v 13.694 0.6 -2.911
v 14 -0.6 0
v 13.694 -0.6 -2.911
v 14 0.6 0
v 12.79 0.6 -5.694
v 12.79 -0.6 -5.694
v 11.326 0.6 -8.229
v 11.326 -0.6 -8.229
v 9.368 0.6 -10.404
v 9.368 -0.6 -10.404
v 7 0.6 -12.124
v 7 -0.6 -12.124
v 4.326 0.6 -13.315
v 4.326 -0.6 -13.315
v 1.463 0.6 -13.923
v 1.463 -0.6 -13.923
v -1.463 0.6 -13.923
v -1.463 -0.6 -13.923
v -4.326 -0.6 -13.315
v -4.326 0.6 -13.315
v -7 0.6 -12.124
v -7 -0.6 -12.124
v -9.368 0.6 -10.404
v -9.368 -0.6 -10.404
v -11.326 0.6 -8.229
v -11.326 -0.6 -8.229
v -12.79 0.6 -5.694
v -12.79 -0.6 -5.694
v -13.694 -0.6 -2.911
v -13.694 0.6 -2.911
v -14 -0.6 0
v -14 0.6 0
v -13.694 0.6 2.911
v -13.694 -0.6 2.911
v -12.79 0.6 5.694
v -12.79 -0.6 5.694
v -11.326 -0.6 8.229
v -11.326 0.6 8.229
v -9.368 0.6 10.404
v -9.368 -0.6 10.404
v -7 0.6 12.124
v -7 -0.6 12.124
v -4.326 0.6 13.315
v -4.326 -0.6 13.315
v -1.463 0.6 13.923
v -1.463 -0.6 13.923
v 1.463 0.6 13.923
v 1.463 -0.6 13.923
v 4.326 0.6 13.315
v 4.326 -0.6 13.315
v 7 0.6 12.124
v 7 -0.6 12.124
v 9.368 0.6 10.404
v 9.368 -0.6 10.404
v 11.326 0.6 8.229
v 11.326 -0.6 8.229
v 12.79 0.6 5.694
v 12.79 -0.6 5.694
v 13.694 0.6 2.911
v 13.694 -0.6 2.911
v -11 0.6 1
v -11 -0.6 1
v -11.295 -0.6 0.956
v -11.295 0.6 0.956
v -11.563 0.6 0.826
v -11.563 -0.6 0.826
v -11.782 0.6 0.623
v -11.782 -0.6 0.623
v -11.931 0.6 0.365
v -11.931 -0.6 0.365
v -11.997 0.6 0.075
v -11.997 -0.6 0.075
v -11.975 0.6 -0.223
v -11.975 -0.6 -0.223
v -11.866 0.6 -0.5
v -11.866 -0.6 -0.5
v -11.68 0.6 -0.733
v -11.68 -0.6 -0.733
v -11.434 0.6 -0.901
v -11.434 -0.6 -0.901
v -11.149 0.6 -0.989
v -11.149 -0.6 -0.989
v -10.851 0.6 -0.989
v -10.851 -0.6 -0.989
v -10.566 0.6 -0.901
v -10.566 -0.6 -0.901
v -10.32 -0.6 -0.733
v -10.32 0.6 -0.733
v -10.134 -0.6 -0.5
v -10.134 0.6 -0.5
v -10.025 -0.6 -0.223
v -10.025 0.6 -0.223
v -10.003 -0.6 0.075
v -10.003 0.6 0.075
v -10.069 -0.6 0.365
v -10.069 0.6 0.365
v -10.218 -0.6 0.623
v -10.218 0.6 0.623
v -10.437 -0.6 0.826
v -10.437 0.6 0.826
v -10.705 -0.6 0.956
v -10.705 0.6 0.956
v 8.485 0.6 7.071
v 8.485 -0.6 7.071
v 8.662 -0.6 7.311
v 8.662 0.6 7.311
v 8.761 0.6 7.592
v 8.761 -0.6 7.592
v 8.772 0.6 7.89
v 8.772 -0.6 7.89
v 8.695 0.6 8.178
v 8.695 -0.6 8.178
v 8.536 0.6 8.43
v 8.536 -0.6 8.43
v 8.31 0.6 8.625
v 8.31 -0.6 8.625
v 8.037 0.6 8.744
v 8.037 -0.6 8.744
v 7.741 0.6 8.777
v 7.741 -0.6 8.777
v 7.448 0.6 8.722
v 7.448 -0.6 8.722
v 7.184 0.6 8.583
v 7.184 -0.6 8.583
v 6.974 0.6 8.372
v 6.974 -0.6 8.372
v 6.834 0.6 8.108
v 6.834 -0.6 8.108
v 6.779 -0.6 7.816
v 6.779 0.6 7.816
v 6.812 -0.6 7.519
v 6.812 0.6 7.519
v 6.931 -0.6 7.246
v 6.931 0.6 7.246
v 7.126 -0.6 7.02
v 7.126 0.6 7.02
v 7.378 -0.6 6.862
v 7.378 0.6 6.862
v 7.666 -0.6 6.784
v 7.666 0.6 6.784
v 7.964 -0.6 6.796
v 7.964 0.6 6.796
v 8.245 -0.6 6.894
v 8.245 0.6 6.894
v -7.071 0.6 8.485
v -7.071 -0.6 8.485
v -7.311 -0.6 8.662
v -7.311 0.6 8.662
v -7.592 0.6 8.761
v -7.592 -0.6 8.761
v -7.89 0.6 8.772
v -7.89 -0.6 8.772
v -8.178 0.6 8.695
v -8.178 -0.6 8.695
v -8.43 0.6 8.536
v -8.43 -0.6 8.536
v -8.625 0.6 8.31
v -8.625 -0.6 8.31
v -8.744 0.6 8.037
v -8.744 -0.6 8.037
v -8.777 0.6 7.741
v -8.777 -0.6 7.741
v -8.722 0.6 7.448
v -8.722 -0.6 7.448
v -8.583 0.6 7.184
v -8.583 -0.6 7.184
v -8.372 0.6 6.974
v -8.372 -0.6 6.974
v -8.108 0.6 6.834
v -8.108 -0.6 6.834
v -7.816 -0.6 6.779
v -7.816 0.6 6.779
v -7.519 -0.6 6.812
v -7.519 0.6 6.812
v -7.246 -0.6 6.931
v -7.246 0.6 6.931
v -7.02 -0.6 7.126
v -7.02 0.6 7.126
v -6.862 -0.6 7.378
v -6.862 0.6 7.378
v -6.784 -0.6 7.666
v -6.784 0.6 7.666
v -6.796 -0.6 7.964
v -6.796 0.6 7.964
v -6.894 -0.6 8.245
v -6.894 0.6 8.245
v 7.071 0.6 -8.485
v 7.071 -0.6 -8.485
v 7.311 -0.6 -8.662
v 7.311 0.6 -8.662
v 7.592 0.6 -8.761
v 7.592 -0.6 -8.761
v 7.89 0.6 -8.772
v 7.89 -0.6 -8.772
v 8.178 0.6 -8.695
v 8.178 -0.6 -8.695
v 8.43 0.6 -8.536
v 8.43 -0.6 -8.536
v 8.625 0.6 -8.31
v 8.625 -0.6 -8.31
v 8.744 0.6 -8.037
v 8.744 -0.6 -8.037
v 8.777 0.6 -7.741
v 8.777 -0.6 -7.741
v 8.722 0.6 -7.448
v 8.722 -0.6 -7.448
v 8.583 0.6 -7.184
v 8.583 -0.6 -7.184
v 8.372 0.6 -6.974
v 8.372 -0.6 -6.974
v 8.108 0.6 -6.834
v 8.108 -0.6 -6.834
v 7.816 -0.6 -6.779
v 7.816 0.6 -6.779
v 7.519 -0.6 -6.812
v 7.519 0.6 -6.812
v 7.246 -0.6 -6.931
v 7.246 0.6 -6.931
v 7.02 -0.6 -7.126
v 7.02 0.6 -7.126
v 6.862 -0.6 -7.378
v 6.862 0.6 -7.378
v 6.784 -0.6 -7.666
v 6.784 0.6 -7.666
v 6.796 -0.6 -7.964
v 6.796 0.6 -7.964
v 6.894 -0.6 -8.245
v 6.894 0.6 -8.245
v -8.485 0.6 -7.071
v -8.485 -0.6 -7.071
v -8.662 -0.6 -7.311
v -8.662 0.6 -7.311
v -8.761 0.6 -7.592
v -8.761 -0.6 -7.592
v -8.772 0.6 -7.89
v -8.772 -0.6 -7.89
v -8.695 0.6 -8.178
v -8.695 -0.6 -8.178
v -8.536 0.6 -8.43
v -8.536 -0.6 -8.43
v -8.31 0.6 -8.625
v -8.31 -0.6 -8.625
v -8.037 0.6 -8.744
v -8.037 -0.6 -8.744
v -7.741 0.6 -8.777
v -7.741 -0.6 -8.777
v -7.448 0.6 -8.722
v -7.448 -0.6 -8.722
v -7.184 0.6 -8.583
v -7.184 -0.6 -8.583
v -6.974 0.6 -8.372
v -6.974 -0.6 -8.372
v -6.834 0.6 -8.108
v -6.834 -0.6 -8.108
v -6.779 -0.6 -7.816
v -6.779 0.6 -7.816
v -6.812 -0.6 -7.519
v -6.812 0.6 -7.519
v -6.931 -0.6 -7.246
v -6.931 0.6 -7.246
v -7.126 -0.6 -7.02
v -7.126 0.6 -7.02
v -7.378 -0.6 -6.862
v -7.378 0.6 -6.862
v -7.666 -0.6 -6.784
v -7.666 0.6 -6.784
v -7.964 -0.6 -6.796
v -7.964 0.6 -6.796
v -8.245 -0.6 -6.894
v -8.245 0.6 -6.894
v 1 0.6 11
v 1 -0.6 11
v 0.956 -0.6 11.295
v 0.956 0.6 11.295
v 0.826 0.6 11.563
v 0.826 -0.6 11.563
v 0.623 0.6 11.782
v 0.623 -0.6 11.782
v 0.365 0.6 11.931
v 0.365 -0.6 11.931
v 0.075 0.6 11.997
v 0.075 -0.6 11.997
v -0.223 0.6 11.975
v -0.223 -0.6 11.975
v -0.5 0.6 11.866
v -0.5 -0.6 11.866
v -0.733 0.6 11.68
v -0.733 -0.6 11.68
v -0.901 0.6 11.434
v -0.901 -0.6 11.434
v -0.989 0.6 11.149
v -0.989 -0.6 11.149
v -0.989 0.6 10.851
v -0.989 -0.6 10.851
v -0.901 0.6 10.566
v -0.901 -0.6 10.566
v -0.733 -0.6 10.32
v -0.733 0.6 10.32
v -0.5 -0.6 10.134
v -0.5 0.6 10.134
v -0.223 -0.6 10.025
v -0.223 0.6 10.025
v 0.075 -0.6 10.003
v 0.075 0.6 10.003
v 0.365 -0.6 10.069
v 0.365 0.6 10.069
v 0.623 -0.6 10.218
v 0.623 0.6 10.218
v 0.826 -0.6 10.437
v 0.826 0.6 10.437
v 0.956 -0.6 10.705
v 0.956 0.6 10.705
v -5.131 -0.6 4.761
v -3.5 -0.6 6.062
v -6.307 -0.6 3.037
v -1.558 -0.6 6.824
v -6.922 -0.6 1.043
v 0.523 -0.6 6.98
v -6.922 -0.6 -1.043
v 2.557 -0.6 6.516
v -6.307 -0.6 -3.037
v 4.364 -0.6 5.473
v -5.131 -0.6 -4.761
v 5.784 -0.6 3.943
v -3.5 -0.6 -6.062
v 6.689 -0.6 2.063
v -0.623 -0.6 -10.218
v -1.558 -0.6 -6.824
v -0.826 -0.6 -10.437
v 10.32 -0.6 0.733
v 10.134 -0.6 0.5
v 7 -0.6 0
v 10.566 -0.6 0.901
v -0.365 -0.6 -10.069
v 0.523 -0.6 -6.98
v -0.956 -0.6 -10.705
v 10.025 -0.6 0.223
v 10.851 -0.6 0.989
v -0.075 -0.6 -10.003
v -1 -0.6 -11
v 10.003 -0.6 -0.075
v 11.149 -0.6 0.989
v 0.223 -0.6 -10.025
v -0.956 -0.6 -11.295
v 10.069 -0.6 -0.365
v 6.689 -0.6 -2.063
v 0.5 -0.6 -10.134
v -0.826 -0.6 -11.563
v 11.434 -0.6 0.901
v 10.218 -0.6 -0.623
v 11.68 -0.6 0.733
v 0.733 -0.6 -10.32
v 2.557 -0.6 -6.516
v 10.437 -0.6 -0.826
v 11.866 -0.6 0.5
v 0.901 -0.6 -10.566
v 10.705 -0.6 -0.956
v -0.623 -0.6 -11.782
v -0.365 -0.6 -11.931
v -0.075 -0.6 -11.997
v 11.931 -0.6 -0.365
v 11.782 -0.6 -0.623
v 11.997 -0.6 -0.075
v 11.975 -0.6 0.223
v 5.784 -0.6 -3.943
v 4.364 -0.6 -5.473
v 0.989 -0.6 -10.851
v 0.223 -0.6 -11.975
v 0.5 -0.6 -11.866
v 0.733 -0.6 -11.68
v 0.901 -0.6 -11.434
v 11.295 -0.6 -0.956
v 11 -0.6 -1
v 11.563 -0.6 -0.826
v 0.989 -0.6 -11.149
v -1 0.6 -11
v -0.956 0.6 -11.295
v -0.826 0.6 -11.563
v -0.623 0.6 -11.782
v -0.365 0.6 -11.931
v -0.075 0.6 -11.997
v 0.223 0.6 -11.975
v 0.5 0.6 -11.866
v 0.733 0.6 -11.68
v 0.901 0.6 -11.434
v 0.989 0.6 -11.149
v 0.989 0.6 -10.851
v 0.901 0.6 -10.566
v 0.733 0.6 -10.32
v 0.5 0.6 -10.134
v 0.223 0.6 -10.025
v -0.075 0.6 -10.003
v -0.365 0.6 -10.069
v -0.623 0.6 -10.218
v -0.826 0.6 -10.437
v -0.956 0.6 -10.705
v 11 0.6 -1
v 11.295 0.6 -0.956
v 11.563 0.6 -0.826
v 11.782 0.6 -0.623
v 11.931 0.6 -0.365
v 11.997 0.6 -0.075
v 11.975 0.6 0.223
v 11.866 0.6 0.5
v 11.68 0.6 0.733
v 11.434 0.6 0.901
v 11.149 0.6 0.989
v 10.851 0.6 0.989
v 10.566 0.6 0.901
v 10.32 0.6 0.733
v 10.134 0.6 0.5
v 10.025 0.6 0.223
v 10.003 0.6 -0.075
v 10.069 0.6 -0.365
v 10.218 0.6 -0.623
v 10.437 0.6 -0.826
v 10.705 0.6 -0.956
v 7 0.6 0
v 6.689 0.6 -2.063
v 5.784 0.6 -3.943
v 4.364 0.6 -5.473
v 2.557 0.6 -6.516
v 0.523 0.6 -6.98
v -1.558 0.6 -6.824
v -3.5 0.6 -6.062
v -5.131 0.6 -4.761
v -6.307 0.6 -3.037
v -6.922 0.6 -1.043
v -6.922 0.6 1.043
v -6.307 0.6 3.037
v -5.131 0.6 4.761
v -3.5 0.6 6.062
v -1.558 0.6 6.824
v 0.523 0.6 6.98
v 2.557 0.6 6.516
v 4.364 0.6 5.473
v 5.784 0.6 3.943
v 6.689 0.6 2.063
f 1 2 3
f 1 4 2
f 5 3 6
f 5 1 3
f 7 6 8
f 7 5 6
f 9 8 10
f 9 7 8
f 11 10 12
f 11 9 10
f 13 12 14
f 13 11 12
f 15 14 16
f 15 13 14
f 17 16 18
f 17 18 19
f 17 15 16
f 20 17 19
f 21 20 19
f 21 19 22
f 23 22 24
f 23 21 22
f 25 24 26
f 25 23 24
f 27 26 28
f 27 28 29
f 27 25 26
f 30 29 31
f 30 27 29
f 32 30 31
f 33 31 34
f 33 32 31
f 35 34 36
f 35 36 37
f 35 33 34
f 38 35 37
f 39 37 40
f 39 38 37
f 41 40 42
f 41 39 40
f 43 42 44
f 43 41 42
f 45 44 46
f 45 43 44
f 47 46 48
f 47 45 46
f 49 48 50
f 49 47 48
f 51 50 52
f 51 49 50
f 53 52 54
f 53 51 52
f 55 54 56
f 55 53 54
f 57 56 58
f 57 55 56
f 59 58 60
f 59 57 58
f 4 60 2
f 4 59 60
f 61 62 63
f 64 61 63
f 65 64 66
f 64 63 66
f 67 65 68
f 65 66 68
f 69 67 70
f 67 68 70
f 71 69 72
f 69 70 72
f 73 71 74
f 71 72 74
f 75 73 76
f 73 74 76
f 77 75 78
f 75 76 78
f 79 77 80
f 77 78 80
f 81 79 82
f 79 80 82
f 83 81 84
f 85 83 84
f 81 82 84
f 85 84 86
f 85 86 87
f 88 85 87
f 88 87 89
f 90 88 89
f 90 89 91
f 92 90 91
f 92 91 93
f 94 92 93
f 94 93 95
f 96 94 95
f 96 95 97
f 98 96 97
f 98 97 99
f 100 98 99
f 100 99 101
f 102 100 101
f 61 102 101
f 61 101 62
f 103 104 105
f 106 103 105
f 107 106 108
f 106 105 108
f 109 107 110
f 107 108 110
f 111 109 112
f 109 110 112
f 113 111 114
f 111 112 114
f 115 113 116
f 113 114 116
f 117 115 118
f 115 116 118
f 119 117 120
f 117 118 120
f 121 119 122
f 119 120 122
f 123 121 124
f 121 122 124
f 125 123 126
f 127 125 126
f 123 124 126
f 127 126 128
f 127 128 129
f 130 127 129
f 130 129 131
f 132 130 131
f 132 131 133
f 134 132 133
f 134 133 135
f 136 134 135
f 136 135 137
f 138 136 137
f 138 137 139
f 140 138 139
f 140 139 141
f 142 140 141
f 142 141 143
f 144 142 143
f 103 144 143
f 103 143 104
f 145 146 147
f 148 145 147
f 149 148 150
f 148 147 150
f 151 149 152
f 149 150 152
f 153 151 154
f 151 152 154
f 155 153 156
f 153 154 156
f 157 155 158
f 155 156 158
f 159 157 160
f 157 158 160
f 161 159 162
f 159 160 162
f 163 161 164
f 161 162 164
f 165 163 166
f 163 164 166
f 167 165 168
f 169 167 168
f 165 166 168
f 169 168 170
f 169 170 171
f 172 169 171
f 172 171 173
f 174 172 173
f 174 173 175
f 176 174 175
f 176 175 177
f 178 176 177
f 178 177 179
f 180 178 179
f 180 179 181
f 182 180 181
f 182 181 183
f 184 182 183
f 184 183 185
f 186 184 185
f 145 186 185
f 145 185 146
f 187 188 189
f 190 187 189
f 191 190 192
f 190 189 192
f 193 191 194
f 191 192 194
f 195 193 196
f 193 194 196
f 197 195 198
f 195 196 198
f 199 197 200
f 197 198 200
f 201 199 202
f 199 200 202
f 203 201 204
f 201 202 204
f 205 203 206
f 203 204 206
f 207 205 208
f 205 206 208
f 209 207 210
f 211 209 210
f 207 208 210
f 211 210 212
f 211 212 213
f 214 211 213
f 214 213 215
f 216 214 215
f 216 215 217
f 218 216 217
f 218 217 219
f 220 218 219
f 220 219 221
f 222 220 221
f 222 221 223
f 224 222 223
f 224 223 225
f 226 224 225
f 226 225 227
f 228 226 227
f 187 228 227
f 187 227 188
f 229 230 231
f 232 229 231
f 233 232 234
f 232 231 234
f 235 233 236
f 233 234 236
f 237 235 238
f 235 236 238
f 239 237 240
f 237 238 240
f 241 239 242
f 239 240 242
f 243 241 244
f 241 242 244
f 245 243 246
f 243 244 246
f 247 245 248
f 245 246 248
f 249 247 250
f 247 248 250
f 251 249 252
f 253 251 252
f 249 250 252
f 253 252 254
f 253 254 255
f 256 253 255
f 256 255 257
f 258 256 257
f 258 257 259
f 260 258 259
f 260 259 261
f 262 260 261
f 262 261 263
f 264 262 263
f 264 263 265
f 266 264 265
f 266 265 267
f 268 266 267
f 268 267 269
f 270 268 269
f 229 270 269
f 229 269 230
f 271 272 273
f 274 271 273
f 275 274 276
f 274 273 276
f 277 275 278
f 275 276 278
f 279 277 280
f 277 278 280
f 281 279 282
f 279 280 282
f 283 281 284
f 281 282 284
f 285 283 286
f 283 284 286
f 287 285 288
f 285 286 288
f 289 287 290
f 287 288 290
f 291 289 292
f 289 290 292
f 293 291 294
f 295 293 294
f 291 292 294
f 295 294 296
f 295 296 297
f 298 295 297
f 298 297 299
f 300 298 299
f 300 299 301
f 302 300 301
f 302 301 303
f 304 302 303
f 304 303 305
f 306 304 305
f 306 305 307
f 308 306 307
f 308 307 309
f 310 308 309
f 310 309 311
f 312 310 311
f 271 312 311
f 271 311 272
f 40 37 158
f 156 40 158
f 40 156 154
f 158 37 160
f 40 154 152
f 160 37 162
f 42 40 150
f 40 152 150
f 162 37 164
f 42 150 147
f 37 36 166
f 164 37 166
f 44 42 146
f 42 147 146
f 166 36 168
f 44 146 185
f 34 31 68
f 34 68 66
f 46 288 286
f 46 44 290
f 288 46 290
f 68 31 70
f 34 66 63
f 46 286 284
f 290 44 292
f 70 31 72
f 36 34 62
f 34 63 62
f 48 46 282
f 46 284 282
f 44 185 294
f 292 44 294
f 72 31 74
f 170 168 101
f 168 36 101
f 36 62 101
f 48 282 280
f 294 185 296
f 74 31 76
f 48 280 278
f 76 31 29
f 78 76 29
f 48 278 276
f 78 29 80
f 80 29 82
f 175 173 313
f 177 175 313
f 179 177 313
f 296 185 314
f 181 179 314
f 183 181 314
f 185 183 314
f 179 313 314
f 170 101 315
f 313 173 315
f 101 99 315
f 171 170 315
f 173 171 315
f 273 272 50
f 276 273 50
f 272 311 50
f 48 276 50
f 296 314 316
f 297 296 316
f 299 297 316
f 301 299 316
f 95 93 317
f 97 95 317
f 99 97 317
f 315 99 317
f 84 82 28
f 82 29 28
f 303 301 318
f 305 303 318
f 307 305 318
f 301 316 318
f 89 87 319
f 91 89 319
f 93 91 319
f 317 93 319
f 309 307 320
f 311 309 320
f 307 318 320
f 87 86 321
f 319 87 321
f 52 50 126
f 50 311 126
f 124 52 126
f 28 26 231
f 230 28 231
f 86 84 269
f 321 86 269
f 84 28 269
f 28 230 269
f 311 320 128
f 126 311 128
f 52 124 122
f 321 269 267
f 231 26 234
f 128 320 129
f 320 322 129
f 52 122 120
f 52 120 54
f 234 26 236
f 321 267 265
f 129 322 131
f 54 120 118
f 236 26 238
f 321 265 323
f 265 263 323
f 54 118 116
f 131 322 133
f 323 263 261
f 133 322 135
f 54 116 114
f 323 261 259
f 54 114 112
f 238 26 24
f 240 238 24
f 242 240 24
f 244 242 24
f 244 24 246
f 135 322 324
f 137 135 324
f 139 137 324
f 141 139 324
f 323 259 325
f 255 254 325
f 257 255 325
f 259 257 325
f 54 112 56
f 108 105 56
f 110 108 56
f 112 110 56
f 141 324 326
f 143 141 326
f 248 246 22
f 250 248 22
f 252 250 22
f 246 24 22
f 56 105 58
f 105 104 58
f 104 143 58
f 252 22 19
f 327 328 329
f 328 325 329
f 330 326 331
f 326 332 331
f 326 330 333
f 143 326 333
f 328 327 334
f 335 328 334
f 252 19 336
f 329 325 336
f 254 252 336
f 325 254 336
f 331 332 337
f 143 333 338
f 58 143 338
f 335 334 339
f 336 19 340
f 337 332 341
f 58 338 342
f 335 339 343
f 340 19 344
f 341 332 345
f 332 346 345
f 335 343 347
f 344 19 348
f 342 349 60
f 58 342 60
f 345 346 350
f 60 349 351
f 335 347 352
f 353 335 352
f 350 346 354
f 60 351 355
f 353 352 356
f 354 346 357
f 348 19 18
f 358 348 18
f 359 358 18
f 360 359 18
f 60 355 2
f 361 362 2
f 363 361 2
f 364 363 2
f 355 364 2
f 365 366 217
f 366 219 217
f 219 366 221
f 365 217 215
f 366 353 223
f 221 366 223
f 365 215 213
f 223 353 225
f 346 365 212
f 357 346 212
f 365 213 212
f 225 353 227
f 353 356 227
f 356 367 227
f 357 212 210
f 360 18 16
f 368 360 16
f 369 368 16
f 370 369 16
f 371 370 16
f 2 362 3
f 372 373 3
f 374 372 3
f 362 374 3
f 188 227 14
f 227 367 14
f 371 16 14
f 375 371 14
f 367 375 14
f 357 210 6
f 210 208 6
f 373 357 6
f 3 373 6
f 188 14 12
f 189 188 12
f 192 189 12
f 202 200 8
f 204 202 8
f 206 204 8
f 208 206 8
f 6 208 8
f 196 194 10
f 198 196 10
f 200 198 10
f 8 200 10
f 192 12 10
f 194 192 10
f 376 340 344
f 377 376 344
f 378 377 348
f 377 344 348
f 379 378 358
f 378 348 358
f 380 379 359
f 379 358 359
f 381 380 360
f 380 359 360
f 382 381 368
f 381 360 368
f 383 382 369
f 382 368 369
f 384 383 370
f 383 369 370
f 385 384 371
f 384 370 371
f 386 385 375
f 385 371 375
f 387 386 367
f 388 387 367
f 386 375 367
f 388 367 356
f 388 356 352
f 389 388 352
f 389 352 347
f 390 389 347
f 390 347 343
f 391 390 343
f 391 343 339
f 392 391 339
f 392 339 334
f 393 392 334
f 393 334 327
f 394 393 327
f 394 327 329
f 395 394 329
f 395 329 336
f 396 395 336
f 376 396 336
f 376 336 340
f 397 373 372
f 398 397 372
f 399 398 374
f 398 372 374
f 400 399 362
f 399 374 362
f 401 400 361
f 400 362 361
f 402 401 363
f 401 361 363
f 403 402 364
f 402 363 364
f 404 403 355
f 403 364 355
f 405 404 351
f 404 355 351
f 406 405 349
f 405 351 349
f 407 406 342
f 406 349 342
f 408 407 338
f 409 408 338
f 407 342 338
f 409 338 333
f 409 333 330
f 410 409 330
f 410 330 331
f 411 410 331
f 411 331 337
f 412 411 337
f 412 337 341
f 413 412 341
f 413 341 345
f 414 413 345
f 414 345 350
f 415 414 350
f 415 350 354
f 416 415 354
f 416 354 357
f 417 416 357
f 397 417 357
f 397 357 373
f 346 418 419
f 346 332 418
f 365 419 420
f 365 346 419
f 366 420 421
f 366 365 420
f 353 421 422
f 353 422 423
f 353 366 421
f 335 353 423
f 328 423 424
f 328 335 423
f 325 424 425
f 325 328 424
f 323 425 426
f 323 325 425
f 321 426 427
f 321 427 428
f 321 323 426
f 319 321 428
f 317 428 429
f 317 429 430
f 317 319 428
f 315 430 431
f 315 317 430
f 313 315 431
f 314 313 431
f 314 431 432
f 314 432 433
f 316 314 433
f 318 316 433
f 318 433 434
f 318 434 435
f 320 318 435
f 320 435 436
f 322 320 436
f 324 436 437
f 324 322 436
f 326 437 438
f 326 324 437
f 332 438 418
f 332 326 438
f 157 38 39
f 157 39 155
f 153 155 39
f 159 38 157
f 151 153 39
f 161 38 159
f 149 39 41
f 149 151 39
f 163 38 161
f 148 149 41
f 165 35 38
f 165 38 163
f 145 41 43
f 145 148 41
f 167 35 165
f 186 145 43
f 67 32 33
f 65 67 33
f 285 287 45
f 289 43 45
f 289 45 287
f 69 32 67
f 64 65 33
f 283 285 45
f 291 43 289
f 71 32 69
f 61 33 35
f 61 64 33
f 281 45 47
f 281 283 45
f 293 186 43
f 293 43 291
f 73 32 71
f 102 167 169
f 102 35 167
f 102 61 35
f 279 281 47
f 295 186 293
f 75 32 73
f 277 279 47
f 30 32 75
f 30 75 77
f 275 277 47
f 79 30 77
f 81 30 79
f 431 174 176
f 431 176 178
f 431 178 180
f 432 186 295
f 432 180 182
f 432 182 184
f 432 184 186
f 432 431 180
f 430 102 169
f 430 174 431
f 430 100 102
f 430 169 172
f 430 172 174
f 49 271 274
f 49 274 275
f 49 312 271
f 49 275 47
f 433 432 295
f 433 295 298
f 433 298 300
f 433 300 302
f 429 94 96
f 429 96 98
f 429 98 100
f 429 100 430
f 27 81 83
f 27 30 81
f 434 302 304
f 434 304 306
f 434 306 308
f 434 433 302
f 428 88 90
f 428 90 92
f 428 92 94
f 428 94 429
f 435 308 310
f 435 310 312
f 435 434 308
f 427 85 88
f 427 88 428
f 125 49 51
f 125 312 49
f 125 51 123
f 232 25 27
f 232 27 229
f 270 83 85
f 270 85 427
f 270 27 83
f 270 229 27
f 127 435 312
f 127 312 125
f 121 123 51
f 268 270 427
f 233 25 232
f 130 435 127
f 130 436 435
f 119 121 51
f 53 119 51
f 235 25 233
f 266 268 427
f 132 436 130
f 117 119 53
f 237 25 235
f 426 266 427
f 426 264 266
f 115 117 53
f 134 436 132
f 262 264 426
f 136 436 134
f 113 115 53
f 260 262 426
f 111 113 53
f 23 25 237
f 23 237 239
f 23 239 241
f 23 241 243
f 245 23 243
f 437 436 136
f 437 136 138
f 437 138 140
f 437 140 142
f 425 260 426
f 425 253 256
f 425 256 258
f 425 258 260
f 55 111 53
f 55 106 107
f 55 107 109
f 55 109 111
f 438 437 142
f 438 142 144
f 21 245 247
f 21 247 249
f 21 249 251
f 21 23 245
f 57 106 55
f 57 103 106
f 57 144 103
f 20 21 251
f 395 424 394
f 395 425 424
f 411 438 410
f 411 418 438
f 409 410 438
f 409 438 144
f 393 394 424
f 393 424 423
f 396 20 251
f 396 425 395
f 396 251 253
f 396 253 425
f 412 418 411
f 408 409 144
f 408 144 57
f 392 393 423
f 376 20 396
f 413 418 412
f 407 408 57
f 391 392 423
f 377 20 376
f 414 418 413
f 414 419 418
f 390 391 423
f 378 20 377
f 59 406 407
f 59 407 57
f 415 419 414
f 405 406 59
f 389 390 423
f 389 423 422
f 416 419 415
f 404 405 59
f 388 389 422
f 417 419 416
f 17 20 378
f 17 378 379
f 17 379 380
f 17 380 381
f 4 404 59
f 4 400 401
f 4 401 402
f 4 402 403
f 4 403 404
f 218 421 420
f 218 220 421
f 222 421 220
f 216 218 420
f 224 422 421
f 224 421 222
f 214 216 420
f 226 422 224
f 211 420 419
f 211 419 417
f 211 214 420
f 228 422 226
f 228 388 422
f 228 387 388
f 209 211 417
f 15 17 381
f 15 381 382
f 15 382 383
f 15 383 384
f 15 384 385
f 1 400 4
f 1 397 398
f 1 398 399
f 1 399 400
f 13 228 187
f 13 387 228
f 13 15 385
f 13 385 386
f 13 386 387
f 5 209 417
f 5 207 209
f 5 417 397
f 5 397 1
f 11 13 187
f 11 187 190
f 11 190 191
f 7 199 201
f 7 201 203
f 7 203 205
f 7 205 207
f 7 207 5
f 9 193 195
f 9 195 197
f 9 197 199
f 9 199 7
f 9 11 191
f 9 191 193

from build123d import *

# Parameters (mm, degrees)
SKETCH1_R             = 14
SKETCH1_R_2           = 7
BOSS_EXTRUDE1_DEPTH   = 0.6
F_2_0MM_DOWEL_HOLE1_D = 2
CIRPATTERN1_COUNT     = 8


with BuildPart() as part:
    # Sketch1 → Boss-Extrude1 (new body, symmetric)
    with BuildSketch(Plane(origin=(0, 0, 0), x_dir=(1, 0, 0), z_dir=(0, 1, 0))):
        Circle(SKETCH1_R)
        Circle(SKETCH1_R_2, mode=Mode.SUBTRACT)
    extrude(amount=BOSS_EXTRUDE1_DEPTH, both=True)

    # Ø2.0mm Dowel Hole1 (through all)
    with Locations(Plane(origin=(0, 0.6, 0), x_dir=(1, 0, 0), z_dir=(0, 1, 0))):
        with Locations((0, 11)):
            f_2_0mm_dowel_hole1 = Hole(F_2_0MM_DOWEL_HOLE1_D / 2)

    # CirPattern1: Ø2.0mm Dowel Hole1 ×8 about axis
    cirpattern1_axis = Axis((0, 0, 0), (0, 1, 0))
    for i in range(1, CIRPATTERN1_COUNT):
        add(f_2_0mm_dowel_hole1.rotate(cirpattern1_axis, i * 360 / CIRPATTERN1_COUNT), mode=Mode.SUBTRACT)


solid = part.part
